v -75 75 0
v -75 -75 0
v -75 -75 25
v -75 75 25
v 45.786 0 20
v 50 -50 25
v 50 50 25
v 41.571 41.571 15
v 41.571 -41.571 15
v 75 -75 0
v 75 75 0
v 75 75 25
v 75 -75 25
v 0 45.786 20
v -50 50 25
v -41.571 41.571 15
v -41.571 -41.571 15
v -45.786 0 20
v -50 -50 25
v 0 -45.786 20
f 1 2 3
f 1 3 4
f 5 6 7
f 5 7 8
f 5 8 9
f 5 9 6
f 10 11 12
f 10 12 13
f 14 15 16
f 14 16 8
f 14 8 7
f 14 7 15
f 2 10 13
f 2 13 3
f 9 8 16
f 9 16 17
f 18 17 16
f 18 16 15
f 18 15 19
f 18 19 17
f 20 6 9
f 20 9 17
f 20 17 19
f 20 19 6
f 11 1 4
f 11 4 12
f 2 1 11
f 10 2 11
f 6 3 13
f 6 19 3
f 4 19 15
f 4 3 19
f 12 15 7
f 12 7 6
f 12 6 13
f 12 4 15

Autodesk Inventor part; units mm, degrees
sketch "Boceto1" plane through (0, 0, 0) normal (0, 0, 1) x (1, 0, 0)
  line L0 (-75, 75) -> (75, 75)
  line L1 (75, 75) -> (75, -75)
  line L2 (75, -75) -> (-75, -75)
  line L3 (-75, -75) -> (-75, 75)
  line L4 (-75, 75) -> (75, -75) construction
  line L5 (75, 75) -> (-75, -75) construction
  point P0 (0, 0)
  dimension "d0" = 150
  dimension "d1" = 150
extrude "Extrusión1" add sketch "Boceto1" along normal blind 25
sketch "Boceto2" plane through (0, 0, 25) normal (0, 0, 1) x (1, 0, 0)
  line L0 (-50, 50) -> (50, 50)
  line L1 (50, 50) -> (50, -50)
  line L2 (50, -50) -> (-50, -50)
  line L3 (-50, -50) -> (-50, 50)
  line L4 (-50, 50) -> (50, -50) construction
  line L5 (50, 50) -> (-50, -50) construction
  point P0 (0, 0)
  dimension "d4" = 100
  dimension "d5" = 100
ref_plane "Plano de trabajo1" through (0, 0, 15) normal (0, 0, 1) x (1, 0, 0)
sketch "Boceto4" plane through (0, 0, 15) normal (0, 0, 1) x (1, 0, 0)
  line L0 (-41.5714, 41.5714) -> (41.5714, 41.5714)
  line L1 (41.5714, 41.5714) -> (41.5714, -41.5714)
  line L2 (41.5714, -41.5714) -> (-41.5714, -41.5714)
  line L3 (-41.5714, -41.5714) -> (-41.5714, 41.5714)
  line L4 (-41.5714, 41.5714) -> (41.5714, -41.5714) construction
  line L5 (41.5714, 41.5714) -> (-41.5714, -41.5714) construction
  point P0 (0, 0)
  dimension "d9" = 83.1428
  dimension "d10" = 83.1428
loft "Solevación1" cut profiles "Boceto2", "Boceto4"
properties part number "Placa - Bolsillo 50°, Profundidad 10 mm"
